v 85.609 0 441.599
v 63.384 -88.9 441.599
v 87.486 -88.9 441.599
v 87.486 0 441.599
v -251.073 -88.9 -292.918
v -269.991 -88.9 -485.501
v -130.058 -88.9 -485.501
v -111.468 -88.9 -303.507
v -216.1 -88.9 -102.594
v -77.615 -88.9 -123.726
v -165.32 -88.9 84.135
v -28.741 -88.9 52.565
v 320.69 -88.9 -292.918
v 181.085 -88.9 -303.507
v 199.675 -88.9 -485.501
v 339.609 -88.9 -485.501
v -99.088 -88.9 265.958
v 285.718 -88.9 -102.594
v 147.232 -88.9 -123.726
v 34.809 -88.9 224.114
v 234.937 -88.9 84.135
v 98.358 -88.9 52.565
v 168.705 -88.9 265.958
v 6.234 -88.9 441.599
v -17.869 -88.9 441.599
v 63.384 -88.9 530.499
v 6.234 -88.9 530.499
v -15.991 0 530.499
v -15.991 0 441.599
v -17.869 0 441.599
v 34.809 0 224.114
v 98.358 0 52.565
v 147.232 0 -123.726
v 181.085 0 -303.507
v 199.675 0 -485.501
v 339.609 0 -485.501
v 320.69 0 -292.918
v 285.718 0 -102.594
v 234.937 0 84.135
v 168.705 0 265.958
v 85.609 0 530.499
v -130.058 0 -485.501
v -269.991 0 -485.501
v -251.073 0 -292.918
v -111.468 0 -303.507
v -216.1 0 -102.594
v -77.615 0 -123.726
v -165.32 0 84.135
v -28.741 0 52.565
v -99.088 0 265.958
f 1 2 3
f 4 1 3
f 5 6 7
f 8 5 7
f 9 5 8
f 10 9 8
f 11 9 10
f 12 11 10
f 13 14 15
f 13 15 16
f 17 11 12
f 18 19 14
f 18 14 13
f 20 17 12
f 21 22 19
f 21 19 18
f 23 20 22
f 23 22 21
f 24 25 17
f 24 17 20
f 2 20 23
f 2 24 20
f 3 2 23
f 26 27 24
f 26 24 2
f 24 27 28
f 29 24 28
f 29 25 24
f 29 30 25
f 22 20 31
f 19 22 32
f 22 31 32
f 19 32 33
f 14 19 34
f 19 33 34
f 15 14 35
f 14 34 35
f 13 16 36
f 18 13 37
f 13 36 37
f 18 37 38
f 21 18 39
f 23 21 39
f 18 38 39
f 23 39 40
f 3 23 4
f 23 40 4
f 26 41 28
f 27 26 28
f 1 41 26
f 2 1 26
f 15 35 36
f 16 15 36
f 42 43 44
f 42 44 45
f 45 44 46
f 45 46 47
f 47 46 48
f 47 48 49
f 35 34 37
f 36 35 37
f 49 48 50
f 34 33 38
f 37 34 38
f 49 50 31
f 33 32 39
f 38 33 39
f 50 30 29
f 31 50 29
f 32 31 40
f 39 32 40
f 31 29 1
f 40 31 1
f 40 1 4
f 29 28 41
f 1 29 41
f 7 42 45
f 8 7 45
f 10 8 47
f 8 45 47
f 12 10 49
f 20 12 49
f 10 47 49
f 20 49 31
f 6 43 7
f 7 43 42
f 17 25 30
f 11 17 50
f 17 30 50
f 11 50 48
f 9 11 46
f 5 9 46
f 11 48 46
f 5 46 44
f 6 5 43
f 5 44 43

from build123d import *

# Parameters (mm, degrees)
F2_DEPTH = 88.9
F3_W     = 26.7864570916
F3_H     = 88.9
F4_DEPTH = 88.9


# Not quite as in the source:
# - a variable given as a bare number and used for a length is read in inches; the dataset says mm whatever the document's units were


with BuildPart() as f2:
    # F1 (on Front) → F2 (new body)
    with BuildSketch(Plane.XZ):
        with BuildLine():
            Line((85.6085425377, 530.4986528046), (34.8085425377, 530.4986528046))
            Line((34.8085425377, 530.4986528046), (-15.9914574623, 530.4986528046))
            Line((-15.9914574623, 530.4986528046), (-17.8685326312, 441.5986528046))
            ThreePointArc((-17.8685326312, 441.5986528046), (-192.6665275597, -8.6975481194), (-269.9914574623, -485.5013471954))
            Line((-269.9914574623, -485.5013471954), (-130.0577898718, -485.5013471954))
            ThreePointArc((-130.0577898718, -485.5013471954), (-77.615001681, -123.7260262863), (34.8085425377, 224.1138442826))
            ThreePointArc((34.8085425377, 224.1138442826), (147.2320867564, -123.7260262863), (199.6748749472, -485.5013471954))
            Line((199.6748749472, -485.5013471954), (339.6085425377, -485.5013471954))
            ThreePointArc((339.6085425377, -485.5013471954), (262.2836126351, -8.6975481194), (87.4856177066, 441.5986528046))
            Line((87.4856177066, 441.5986528046), (85.6085425377, 530.4986528046))
        make_face()
    extrude(amount=F2_DEPTH)

    # F3 (on face) → F4 (cut)
    with BuildSketch(Plane.XY.offset(530.4986528046)):
        Polygon((-15.9914574623, -88.9), (6.2335425377, -88.9), (-15.9914574623, 0), align=None)
        Polygon((85.6085425377, 0), (63.3835425377, -88.9), (85.6085425377, -88.9), align=None)
        Polygon((122.7087825537, 0), (85.6085425377, 0), (85.6085425377, -88.9), (129.0911585093, -88.9), align=None)
        with Locations((-29.3846860081, -44.45)):
            Rectangle(F3_W, F3_H)
    extrude(amount=-F4_DEPTH, mode=Mode.SUBTRACT)


solid = f2.part
